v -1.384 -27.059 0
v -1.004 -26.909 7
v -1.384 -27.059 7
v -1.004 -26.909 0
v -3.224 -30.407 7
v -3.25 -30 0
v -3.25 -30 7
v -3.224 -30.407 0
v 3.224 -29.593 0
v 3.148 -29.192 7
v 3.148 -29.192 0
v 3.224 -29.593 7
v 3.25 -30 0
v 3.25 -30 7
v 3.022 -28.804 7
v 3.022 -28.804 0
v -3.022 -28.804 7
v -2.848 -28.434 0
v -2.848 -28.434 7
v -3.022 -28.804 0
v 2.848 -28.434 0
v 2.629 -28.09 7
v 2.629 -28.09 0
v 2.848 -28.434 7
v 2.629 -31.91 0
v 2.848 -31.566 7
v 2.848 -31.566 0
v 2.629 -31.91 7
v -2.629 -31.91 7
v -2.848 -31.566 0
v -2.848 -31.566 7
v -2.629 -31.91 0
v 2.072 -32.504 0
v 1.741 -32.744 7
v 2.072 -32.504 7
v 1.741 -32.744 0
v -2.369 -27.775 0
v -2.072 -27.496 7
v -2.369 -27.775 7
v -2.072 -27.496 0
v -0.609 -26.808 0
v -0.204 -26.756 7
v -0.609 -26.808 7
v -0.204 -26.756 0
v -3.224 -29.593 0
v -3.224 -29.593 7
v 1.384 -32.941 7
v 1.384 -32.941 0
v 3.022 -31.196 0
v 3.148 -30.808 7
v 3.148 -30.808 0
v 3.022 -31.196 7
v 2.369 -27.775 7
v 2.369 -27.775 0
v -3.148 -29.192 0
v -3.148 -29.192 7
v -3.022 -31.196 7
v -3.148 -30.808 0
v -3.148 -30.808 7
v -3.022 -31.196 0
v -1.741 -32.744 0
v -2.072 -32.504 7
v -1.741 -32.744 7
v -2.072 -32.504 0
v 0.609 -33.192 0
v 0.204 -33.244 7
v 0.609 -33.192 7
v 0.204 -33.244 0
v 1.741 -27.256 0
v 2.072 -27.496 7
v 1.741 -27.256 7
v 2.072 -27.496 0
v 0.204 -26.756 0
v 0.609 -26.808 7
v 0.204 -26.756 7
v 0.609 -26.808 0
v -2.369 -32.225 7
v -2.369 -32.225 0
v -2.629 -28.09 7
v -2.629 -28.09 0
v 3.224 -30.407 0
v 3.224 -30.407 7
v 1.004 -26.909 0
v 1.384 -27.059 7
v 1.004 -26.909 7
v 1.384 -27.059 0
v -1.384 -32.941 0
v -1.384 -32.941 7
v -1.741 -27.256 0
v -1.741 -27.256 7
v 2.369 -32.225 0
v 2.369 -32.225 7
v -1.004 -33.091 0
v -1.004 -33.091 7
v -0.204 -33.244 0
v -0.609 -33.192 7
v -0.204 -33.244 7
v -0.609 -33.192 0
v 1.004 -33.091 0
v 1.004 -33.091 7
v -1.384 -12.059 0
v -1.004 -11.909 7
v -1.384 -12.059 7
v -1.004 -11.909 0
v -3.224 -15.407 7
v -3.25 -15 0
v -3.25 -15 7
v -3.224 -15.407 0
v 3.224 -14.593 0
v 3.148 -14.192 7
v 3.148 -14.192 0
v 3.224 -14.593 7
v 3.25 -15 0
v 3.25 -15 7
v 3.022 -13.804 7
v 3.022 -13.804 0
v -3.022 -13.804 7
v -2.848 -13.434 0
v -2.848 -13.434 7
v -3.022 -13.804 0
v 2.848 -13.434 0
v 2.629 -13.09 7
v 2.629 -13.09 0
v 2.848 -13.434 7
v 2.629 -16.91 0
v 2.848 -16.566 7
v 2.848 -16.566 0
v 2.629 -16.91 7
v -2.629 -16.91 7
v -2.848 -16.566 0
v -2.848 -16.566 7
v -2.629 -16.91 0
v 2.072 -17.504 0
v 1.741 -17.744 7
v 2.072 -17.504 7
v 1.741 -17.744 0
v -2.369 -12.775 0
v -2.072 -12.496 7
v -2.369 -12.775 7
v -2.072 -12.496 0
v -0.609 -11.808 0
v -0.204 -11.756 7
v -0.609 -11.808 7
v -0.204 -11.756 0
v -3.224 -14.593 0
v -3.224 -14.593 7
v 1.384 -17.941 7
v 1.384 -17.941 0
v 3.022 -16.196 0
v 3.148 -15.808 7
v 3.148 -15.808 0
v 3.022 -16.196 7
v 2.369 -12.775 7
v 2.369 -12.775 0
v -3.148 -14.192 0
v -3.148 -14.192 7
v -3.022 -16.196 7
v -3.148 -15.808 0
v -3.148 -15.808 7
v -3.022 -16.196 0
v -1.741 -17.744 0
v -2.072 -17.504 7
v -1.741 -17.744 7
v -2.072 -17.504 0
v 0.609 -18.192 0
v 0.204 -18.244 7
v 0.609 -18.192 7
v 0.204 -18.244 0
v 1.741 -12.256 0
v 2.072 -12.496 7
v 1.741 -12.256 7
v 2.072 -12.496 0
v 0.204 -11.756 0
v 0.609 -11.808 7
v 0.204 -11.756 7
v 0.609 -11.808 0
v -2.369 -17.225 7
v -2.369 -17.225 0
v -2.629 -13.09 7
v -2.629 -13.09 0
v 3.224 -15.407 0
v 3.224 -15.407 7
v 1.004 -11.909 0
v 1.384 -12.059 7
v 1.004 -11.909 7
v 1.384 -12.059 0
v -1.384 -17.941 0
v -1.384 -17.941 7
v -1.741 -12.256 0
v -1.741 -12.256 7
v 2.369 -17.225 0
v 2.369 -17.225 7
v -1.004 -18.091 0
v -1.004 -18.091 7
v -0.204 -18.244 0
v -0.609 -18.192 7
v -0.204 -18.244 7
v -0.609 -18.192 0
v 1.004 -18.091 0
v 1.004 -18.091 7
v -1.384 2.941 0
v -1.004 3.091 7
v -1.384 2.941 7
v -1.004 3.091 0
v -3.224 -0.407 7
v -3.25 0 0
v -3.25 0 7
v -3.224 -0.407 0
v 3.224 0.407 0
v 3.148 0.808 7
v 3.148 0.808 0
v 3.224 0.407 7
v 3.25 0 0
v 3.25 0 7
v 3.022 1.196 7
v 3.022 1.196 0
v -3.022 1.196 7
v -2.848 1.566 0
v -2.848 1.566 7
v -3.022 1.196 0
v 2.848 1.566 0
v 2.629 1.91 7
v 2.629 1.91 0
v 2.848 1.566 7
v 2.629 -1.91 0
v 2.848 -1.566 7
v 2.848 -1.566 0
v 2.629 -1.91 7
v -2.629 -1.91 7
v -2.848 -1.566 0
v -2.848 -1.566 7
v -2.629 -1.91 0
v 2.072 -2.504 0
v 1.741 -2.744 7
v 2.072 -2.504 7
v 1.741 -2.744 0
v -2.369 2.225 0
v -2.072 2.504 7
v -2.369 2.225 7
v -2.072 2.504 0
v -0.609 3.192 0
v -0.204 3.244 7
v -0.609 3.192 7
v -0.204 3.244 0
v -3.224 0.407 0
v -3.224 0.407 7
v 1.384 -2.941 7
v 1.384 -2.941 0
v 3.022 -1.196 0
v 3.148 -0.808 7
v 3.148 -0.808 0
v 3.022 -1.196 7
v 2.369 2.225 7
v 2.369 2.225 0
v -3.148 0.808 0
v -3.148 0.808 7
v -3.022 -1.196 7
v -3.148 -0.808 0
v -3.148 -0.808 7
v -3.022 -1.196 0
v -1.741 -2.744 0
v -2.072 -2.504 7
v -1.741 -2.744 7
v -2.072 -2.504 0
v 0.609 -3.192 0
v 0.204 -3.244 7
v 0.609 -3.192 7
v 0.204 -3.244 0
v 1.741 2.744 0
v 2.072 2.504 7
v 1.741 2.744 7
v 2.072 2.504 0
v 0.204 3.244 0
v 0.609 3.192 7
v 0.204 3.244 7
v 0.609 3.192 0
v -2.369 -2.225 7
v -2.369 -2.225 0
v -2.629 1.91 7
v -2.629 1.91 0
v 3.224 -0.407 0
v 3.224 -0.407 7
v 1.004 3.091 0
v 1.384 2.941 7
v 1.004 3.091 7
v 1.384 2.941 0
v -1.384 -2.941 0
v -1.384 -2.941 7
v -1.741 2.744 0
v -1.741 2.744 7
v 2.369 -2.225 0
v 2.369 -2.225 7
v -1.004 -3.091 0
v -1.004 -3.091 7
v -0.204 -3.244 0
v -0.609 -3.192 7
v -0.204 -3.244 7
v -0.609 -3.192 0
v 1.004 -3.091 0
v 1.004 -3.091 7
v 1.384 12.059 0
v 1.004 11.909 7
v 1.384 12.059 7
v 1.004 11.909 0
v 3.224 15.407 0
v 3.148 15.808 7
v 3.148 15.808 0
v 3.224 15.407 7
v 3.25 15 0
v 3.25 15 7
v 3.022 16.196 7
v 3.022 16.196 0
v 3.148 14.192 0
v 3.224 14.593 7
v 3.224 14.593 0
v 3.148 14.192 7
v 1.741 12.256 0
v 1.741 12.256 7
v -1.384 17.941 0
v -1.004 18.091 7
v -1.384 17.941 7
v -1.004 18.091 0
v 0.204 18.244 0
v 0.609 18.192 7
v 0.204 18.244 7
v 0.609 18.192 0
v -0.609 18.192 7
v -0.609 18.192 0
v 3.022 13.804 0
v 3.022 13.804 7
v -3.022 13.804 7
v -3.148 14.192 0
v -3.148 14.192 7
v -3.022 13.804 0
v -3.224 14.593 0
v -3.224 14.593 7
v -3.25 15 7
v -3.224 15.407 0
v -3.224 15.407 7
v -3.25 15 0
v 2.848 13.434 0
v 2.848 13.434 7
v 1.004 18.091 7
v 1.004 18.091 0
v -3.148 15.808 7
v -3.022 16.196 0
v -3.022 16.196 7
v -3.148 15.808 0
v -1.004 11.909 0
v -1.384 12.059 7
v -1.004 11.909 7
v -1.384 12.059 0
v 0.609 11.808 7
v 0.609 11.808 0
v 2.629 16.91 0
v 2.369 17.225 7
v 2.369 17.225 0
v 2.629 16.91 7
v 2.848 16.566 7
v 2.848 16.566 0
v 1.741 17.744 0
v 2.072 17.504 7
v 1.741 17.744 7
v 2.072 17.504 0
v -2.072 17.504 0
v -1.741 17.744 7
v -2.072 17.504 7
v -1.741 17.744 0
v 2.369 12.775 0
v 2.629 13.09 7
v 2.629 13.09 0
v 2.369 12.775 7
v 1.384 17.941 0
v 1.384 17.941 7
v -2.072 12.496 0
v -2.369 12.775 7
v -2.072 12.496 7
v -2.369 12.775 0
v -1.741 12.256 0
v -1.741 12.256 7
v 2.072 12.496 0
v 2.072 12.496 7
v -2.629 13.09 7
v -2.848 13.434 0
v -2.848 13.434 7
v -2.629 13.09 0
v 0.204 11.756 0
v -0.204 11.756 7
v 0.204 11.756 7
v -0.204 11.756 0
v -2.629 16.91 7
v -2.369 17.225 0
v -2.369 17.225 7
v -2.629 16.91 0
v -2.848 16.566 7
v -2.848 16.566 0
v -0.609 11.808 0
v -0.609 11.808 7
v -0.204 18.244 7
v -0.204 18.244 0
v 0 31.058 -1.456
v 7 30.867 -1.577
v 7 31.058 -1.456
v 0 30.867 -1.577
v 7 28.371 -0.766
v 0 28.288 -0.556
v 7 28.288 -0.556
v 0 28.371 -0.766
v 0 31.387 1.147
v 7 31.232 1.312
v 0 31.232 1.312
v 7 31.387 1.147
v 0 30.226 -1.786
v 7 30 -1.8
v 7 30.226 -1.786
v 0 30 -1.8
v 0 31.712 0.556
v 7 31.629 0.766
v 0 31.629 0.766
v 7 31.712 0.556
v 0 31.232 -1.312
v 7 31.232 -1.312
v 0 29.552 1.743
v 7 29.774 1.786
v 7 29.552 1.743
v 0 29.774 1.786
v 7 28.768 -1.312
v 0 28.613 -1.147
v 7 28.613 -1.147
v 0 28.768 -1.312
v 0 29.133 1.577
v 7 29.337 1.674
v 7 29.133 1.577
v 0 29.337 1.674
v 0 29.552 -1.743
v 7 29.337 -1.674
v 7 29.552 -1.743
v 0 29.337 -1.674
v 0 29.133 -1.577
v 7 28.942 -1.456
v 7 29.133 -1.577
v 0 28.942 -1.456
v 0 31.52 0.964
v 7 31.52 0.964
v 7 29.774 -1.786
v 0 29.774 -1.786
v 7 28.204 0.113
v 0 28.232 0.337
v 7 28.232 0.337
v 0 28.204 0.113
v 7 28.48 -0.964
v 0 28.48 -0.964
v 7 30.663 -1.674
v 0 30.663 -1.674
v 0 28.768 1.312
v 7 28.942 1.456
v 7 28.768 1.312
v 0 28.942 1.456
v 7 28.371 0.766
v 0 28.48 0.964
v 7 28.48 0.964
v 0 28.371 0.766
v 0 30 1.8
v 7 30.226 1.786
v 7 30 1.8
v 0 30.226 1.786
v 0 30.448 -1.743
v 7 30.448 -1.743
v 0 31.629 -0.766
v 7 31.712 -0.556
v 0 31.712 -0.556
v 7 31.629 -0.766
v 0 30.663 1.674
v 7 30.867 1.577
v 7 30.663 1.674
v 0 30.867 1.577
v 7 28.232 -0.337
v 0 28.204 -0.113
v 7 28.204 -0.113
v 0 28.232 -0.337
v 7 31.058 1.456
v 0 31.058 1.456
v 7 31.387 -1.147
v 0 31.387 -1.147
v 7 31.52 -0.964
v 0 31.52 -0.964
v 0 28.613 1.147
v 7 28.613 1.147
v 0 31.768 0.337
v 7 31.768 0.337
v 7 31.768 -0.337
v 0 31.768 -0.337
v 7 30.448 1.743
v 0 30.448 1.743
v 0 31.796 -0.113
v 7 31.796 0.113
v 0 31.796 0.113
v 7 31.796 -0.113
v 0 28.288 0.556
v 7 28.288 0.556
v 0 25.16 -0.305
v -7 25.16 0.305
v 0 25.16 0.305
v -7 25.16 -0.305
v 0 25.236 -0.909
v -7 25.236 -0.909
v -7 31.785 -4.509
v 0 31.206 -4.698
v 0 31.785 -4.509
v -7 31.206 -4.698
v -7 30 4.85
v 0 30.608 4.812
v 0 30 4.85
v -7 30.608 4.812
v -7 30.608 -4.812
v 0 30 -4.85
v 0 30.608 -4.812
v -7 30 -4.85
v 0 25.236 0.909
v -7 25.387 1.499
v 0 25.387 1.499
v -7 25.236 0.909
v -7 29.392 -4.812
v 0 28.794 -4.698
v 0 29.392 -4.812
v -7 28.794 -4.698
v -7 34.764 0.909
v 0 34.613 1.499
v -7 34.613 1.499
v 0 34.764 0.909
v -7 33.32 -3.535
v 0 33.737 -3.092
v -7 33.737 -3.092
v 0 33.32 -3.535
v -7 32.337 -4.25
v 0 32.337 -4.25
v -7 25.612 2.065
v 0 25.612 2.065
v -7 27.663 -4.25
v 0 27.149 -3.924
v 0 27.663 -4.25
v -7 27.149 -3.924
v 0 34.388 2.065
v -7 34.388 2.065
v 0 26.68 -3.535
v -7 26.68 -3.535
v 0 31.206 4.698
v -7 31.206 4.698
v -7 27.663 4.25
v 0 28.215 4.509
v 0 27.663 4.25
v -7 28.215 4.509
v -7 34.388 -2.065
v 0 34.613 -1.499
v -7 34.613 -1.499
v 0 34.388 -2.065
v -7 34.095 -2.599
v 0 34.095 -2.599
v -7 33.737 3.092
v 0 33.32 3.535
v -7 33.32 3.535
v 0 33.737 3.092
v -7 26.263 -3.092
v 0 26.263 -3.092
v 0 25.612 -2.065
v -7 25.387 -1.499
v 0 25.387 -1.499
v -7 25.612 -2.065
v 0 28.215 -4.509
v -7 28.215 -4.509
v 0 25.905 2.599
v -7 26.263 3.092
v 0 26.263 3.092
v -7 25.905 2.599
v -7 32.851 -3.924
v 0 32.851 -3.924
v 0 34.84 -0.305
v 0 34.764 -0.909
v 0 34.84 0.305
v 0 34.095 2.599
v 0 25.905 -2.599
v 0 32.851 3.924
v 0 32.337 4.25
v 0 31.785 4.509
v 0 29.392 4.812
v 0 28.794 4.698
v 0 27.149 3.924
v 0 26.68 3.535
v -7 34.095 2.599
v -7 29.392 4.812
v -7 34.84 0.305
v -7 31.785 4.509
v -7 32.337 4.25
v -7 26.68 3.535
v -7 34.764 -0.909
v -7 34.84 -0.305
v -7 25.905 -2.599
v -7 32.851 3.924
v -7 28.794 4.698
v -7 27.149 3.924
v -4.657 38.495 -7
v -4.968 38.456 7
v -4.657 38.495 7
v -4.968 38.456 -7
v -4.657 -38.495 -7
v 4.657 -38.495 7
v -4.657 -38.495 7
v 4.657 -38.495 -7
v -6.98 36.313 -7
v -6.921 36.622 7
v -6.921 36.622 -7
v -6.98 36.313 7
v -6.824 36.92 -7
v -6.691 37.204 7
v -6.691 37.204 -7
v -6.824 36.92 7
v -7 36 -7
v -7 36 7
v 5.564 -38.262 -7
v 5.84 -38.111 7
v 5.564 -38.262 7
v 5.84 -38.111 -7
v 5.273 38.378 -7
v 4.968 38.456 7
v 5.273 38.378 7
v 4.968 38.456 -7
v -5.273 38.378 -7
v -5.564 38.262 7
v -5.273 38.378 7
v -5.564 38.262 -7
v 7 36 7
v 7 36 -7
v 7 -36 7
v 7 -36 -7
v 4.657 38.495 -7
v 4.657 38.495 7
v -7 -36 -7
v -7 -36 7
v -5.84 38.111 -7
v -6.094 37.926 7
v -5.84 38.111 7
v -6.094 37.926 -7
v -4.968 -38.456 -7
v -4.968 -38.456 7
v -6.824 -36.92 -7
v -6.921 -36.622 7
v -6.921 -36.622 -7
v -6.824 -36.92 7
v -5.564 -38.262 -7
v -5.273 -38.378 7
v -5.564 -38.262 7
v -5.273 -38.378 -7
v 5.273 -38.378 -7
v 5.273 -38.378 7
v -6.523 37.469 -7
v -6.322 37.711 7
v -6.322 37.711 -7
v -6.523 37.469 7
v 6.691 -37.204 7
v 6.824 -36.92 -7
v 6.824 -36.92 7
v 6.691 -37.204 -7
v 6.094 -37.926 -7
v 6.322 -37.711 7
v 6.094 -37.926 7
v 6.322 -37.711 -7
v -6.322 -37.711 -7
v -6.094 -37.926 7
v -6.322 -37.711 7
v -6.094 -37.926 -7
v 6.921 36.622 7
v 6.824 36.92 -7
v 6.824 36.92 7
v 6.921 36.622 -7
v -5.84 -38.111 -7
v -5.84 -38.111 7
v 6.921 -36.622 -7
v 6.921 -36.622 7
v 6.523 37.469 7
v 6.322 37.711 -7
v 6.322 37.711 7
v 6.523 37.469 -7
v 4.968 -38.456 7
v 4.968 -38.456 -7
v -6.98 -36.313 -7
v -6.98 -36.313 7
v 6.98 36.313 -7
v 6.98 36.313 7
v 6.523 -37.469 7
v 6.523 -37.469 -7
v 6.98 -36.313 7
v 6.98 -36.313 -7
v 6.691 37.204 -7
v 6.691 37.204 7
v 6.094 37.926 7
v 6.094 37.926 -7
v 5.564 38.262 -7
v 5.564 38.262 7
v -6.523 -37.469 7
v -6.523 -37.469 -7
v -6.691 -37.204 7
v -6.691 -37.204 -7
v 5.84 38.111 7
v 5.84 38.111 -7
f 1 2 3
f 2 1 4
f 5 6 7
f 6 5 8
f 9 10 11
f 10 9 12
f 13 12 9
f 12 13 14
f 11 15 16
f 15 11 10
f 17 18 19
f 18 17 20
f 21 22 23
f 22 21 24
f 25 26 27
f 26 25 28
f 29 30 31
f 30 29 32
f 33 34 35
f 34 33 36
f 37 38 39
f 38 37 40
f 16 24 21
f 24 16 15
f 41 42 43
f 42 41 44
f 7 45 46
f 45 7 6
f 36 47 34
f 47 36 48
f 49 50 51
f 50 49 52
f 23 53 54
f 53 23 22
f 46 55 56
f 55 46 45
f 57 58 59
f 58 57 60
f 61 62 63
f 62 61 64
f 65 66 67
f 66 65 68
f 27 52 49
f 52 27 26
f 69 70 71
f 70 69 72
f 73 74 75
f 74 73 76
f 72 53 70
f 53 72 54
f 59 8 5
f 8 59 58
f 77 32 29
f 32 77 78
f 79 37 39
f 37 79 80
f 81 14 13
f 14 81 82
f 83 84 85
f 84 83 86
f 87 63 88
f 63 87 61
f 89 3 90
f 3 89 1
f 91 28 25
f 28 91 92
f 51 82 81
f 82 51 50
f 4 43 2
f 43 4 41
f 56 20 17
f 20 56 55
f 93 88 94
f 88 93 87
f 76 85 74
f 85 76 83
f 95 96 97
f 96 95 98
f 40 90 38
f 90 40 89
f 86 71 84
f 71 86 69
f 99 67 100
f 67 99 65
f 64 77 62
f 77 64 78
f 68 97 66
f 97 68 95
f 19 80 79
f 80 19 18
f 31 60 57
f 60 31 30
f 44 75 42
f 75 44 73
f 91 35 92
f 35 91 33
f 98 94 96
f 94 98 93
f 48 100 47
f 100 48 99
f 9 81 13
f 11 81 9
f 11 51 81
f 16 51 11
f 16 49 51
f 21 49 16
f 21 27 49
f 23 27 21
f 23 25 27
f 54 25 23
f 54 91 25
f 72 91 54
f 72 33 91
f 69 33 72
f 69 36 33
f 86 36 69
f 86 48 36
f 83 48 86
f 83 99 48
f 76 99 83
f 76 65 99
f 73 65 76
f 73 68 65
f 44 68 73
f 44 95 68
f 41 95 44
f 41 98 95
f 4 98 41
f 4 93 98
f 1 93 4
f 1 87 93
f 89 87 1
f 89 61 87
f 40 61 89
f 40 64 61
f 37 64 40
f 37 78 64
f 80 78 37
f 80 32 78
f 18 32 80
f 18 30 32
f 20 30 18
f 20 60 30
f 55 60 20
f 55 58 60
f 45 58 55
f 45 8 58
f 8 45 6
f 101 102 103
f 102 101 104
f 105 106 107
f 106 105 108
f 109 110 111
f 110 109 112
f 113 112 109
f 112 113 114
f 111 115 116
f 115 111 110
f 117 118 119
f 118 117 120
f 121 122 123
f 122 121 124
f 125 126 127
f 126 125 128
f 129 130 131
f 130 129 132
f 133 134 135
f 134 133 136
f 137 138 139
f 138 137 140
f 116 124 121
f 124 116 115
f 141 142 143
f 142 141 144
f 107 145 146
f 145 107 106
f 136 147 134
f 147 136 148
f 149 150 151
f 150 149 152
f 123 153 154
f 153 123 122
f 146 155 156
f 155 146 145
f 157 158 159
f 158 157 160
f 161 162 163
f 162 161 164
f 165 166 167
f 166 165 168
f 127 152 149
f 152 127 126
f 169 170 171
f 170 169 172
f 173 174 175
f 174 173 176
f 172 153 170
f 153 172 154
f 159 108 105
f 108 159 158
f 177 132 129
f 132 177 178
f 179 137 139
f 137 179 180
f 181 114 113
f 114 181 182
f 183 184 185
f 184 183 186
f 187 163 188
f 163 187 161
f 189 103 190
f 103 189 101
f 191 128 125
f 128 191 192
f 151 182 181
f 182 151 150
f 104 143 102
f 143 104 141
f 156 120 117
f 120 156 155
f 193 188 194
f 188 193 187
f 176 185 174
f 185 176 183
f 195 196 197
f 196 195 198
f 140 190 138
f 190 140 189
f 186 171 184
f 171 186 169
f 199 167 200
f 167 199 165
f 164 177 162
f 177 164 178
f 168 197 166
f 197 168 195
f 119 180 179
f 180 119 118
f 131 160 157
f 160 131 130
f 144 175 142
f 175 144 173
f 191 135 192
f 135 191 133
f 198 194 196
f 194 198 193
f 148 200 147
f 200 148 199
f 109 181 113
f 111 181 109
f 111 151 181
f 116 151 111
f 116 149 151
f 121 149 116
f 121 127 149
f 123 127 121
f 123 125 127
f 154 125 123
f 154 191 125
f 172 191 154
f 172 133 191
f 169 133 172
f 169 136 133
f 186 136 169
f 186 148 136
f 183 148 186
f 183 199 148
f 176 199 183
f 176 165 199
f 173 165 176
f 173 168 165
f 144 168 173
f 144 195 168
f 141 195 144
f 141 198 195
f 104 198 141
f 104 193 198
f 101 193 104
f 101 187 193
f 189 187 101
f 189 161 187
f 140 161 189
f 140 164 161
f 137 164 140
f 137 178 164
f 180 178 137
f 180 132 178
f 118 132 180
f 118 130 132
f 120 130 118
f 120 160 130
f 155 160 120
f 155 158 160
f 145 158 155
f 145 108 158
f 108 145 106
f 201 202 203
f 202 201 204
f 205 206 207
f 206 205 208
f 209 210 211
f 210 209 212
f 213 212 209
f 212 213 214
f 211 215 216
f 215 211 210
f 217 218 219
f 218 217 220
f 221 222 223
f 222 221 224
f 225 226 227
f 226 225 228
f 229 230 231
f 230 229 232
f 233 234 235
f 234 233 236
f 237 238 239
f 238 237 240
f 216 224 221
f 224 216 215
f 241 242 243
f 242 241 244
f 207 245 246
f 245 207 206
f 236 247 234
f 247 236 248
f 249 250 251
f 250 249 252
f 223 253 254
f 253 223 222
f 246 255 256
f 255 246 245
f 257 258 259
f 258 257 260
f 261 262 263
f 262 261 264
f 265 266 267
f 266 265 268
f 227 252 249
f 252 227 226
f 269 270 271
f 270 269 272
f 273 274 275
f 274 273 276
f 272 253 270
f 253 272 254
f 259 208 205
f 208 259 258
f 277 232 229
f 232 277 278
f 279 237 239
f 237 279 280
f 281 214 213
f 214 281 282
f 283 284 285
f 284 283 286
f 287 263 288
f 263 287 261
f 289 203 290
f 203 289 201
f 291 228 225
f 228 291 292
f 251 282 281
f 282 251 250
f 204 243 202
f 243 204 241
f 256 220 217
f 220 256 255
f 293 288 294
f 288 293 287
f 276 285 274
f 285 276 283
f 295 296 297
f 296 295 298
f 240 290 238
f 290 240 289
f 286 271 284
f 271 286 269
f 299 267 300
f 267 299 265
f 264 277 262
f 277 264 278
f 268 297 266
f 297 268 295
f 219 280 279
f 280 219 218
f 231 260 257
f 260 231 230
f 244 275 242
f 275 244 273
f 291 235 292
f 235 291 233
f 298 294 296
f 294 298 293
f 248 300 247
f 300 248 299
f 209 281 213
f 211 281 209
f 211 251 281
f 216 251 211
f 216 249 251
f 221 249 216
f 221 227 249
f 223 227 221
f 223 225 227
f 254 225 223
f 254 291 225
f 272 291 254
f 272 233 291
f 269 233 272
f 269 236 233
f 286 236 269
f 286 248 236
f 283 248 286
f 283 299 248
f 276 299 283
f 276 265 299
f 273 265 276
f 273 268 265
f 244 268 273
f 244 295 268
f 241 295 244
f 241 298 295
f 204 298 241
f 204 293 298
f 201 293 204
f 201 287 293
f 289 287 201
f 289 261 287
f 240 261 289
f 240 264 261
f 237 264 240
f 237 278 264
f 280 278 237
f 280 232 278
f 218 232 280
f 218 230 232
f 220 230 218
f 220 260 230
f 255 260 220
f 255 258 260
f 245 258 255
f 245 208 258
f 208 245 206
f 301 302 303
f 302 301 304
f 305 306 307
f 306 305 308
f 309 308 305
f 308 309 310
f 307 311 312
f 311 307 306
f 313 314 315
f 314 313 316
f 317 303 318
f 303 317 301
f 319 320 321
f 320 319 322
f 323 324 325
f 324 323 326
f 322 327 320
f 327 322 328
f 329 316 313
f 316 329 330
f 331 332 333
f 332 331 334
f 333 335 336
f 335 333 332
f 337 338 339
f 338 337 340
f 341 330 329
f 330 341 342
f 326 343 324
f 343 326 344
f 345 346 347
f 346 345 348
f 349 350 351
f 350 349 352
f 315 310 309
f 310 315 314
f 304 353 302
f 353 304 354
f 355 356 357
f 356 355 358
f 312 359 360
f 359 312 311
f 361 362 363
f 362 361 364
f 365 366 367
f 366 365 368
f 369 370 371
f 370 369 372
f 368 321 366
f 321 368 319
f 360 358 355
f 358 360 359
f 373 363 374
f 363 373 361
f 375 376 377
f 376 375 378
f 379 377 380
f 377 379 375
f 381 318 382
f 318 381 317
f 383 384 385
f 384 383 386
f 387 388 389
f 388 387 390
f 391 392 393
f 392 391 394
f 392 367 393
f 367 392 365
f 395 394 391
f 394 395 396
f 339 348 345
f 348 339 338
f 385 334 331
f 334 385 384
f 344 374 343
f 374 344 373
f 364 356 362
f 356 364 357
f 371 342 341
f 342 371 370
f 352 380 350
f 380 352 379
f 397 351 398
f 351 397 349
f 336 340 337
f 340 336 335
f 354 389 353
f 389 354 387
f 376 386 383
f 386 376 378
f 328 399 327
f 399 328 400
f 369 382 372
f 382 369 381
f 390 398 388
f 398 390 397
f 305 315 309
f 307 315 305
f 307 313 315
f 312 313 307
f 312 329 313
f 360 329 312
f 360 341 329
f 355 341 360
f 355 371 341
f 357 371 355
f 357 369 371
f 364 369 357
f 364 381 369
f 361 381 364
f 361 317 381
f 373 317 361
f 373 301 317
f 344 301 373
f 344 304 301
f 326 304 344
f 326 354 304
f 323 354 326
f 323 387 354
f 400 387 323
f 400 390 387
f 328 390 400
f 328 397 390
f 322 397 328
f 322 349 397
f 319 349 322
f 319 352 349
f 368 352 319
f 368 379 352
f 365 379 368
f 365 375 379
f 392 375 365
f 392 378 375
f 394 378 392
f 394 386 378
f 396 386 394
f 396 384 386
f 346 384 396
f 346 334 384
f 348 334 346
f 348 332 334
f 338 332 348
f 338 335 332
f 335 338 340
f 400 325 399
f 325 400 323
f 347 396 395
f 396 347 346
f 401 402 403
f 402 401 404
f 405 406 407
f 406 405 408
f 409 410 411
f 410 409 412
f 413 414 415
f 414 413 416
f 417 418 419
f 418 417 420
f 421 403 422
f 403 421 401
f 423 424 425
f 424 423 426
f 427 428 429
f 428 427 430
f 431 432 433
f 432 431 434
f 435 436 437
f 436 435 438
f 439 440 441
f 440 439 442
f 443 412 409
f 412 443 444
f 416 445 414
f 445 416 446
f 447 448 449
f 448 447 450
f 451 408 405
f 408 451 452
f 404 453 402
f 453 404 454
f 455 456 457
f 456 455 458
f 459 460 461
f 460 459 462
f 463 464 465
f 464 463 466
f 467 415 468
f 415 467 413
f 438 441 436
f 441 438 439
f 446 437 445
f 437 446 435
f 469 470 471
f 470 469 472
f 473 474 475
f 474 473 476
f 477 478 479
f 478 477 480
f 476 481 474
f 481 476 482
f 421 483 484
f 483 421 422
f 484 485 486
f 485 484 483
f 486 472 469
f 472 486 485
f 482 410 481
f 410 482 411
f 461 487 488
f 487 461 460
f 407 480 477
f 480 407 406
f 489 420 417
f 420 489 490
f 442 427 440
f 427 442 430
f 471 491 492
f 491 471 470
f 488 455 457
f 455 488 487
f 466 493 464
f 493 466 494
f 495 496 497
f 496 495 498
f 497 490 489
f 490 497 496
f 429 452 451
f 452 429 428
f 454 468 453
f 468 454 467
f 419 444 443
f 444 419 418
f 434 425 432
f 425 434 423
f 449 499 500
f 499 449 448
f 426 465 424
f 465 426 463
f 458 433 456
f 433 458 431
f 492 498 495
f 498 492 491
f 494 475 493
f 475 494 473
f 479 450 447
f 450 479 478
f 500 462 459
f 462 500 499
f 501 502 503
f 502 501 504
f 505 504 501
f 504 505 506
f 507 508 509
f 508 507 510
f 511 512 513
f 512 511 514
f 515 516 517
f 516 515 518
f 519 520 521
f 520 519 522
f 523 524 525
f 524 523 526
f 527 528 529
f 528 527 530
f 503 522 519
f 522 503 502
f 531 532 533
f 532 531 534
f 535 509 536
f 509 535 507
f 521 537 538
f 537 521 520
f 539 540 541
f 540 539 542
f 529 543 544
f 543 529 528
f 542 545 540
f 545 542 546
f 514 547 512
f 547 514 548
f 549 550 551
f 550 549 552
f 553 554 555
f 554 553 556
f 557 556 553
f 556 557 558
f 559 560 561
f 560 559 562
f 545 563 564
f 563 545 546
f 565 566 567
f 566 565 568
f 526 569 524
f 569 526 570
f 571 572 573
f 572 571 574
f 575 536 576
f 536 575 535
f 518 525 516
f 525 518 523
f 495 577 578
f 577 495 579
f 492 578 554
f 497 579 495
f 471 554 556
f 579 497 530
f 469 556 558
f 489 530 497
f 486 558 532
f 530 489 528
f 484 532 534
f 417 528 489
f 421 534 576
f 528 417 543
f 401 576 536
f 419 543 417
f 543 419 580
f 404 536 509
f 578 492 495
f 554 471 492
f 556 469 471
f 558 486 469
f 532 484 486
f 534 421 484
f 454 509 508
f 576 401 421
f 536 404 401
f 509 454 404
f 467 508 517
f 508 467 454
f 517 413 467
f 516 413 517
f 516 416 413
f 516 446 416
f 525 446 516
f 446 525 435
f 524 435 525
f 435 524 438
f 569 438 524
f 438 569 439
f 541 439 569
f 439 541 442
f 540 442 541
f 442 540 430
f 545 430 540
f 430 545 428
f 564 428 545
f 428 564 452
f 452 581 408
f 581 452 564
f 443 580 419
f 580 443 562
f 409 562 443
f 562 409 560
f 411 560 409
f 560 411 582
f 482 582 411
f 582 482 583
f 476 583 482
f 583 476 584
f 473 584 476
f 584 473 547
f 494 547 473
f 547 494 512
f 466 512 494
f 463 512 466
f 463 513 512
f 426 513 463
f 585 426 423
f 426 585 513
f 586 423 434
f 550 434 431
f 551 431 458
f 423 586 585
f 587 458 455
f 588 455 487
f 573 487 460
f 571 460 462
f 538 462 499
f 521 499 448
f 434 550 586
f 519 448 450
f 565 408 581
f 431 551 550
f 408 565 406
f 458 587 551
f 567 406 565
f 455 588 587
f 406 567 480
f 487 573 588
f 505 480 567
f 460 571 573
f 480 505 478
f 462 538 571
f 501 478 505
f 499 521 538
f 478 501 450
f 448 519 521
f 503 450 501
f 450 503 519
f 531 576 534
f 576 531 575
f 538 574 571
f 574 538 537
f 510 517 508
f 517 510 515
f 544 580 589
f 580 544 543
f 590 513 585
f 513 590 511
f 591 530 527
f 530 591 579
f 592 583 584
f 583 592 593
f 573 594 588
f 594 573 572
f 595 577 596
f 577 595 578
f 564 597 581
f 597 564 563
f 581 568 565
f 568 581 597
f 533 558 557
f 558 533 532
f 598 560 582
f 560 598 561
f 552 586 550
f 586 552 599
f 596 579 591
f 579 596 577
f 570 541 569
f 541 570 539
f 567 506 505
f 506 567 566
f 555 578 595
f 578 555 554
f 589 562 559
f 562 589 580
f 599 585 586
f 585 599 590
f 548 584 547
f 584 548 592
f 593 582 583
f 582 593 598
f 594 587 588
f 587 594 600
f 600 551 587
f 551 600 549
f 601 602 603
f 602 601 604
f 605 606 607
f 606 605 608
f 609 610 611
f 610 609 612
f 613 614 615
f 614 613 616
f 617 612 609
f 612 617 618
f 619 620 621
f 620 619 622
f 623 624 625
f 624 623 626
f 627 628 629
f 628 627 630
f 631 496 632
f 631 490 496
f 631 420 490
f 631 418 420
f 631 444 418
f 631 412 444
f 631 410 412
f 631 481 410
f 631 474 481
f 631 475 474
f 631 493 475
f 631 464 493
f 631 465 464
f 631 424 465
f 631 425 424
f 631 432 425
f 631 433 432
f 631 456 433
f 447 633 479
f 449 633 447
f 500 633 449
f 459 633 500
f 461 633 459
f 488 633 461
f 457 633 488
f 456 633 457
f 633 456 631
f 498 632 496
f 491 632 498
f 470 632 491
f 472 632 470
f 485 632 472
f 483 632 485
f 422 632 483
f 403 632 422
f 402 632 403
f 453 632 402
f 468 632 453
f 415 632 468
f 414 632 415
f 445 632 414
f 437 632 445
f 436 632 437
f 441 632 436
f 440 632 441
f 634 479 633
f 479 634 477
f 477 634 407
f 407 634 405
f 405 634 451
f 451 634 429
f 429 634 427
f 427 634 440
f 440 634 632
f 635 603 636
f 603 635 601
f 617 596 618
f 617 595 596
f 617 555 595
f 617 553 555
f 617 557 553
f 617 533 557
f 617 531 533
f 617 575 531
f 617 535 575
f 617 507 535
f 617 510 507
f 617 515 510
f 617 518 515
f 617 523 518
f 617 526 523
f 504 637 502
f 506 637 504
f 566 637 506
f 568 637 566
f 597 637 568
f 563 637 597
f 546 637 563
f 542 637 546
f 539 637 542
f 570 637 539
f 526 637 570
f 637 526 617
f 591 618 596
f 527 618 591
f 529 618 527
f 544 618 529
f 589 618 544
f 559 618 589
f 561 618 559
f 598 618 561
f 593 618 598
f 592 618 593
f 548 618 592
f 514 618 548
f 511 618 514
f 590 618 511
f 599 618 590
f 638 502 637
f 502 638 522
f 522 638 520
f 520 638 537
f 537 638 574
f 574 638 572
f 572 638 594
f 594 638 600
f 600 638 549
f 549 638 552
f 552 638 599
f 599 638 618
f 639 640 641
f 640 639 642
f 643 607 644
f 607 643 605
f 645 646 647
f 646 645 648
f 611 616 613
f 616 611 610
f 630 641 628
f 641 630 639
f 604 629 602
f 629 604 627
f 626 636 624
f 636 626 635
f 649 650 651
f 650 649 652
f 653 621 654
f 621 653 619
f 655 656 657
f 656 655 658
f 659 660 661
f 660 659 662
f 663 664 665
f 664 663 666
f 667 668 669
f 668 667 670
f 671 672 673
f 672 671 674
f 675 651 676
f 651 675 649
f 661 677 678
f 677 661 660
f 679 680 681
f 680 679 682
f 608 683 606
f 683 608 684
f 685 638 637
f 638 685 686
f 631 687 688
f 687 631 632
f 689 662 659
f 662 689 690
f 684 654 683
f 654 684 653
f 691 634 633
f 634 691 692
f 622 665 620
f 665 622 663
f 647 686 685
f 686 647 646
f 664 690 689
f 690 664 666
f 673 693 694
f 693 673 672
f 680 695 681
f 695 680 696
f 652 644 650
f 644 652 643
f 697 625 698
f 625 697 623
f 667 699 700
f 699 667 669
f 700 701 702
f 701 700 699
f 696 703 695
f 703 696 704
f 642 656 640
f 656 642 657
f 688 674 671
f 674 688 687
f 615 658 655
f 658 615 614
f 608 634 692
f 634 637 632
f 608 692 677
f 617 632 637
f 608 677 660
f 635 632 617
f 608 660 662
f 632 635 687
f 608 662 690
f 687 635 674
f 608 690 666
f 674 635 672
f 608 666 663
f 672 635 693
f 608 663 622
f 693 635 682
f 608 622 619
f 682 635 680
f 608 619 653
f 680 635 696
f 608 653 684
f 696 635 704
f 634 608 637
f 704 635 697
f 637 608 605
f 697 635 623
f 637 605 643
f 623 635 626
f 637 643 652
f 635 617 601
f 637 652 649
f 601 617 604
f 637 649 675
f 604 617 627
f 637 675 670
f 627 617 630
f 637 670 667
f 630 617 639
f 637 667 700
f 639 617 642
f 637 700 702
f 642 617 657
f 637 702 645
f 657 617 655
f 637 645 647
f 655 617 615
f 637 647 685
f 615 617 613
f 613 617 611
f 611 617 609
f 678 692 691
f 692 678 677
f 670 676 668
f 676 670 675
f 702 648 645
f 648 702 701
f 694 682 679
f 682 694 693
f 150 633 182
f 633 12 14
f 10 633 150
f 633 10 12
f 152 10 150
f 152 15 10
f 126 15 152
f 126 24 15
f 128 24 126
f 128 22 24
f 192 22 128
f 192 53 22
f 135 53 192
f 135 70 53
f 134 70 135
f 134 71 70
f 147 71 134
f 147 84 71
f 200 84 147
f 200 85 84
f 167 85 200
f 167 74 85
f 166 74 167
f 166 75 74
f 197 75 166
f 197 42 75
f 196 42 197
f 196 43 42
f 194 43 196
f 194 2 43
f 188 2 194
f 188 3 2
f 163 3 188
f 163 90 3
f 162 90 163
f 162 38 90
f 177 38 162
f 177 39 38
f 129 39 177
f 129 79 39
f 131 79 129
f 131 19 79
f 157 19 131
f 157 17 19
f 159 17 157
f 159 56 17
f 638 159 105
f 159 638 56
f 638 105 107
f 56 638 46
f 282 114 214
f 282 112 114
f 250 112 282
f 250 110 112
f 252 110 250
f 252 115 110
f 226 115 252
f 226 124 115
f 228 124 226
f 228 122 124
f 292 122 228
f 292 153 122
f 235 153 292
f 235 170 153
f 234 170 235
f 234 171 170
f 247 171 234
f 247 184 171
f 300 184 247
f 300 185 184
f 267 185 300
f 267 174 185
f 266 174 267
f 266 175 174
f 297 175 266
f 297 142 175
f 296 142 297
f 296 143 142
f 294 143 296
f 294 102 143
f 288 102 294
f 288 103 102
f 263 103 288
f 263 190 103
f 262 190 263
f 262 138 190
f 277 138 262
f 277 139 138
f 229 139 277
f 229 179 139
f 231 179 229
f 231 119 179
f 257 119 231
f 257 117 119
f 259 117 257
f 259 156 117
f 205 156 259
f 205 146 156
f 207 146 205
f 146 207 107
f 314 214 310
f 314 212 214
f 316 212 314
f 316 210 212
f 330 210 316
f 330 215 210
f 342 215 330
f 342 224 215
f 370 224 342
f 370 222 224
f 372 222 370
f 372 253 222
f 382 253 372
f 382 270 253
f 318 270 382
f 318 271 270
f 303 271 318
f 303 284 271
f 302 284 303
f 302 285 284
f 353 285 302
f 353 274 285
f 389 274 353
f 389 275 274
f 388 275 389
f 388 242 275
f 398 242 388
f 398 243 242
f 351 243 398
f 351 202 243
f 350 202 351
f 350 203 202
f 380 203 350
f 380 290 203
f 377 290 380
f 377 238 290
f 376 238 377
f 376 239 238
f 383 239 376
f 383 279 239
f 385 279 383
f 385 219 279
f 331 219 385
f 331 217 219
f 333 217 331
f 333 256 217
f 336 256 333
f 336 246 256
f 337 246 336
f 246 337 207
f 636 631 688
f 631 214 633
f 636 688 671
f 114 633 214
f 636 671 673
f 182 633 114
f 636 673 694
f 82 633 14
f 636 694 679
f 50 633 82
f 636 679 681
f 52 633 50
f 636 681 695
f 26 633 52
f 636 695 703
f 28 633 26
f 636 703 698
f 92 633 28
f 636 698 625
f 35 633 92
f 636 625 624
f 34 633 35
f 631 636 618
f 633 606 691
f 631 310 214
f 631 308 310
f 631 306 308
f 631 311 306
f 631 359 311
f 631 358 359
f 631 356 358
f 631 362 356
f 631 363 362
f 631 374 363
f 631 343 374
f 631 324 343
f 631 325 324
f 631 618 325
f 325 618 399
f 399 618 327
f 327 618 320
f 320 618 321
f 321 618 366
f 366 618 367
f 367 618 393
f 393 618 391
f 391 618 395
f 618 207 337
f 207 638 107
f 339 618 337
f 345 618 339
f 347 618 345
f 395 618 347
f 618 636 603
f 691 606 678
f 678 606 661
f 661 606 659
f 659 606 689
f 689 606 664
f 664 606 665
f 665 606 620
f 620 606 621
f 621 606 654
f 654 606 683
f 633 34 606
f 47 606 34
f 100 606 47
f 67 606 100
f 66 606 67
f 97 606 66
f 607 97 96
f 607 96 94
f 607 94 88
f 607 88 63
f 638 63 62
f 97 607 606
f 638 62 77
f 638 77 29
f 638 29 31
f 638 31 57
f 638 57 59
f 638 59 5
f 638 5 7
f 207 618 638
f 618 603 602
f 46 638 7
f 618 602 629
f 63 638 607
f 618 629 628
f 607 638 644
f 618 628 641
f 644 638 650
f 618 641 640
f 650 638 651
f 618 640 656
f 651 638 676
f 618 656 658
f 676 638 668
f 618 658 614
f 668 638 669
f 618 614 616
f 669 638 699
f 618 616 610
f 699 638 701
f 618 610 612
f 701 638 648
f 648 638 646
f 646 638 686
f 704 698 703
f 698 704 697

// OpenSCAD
$fn = 50;


difference() {
	union() {
		translate(v = [0, 0, -7.0000000000]) {
			hull() {
				translate(v = [-4.5000000000, 36.0000000000, 0]) {
					cylinder(h = 14, r = 2.5000000000);
				}
				translate(v = [4.5000000000, 36.0000000000, 0]) {
					cylinder(h = 14, r = 2.5000000000);
				}
				translate(v = [-4.5000000000, -36.0000000000, 0]) {
					cylinder(h = 14, r = 2.5000000000);
				}
				translate(v = [4.5000000000, -36.0000000000, 0]) {
					cylinder(h = 14, r = 2.5000000000);
				}
			}
		}
	}
	union() {
		translate(v = [0.0000000000, -30.0000000000, 0]) {
			cylinder(h = 100, r = 3.2500000000);
		}
		translate(v = [0.0000000000, -15.0000000000, 0]) {
			cylinder(h = 100, r = 3.2500000000);
		}
		cylinder(h = 100, r = 3.2500000000);
		translate(v = [0.0000000000, 15.0000000000, 0]) {
			cylinder(h = 100, r = 3.2500000000);
		}
		translate(v = [-50, 30, 0]) {
			rotate(a = [0, 90, 0]) {
				cylinder(h = 100, r = 1.8000000000);
			}
		}
		translate(v = [-100, 30, 0]) {
			rotate(a = [0, 90, 0]) {
				cylinder(h = 100, r = 4.8500000000);
			}
		}
	}
}
